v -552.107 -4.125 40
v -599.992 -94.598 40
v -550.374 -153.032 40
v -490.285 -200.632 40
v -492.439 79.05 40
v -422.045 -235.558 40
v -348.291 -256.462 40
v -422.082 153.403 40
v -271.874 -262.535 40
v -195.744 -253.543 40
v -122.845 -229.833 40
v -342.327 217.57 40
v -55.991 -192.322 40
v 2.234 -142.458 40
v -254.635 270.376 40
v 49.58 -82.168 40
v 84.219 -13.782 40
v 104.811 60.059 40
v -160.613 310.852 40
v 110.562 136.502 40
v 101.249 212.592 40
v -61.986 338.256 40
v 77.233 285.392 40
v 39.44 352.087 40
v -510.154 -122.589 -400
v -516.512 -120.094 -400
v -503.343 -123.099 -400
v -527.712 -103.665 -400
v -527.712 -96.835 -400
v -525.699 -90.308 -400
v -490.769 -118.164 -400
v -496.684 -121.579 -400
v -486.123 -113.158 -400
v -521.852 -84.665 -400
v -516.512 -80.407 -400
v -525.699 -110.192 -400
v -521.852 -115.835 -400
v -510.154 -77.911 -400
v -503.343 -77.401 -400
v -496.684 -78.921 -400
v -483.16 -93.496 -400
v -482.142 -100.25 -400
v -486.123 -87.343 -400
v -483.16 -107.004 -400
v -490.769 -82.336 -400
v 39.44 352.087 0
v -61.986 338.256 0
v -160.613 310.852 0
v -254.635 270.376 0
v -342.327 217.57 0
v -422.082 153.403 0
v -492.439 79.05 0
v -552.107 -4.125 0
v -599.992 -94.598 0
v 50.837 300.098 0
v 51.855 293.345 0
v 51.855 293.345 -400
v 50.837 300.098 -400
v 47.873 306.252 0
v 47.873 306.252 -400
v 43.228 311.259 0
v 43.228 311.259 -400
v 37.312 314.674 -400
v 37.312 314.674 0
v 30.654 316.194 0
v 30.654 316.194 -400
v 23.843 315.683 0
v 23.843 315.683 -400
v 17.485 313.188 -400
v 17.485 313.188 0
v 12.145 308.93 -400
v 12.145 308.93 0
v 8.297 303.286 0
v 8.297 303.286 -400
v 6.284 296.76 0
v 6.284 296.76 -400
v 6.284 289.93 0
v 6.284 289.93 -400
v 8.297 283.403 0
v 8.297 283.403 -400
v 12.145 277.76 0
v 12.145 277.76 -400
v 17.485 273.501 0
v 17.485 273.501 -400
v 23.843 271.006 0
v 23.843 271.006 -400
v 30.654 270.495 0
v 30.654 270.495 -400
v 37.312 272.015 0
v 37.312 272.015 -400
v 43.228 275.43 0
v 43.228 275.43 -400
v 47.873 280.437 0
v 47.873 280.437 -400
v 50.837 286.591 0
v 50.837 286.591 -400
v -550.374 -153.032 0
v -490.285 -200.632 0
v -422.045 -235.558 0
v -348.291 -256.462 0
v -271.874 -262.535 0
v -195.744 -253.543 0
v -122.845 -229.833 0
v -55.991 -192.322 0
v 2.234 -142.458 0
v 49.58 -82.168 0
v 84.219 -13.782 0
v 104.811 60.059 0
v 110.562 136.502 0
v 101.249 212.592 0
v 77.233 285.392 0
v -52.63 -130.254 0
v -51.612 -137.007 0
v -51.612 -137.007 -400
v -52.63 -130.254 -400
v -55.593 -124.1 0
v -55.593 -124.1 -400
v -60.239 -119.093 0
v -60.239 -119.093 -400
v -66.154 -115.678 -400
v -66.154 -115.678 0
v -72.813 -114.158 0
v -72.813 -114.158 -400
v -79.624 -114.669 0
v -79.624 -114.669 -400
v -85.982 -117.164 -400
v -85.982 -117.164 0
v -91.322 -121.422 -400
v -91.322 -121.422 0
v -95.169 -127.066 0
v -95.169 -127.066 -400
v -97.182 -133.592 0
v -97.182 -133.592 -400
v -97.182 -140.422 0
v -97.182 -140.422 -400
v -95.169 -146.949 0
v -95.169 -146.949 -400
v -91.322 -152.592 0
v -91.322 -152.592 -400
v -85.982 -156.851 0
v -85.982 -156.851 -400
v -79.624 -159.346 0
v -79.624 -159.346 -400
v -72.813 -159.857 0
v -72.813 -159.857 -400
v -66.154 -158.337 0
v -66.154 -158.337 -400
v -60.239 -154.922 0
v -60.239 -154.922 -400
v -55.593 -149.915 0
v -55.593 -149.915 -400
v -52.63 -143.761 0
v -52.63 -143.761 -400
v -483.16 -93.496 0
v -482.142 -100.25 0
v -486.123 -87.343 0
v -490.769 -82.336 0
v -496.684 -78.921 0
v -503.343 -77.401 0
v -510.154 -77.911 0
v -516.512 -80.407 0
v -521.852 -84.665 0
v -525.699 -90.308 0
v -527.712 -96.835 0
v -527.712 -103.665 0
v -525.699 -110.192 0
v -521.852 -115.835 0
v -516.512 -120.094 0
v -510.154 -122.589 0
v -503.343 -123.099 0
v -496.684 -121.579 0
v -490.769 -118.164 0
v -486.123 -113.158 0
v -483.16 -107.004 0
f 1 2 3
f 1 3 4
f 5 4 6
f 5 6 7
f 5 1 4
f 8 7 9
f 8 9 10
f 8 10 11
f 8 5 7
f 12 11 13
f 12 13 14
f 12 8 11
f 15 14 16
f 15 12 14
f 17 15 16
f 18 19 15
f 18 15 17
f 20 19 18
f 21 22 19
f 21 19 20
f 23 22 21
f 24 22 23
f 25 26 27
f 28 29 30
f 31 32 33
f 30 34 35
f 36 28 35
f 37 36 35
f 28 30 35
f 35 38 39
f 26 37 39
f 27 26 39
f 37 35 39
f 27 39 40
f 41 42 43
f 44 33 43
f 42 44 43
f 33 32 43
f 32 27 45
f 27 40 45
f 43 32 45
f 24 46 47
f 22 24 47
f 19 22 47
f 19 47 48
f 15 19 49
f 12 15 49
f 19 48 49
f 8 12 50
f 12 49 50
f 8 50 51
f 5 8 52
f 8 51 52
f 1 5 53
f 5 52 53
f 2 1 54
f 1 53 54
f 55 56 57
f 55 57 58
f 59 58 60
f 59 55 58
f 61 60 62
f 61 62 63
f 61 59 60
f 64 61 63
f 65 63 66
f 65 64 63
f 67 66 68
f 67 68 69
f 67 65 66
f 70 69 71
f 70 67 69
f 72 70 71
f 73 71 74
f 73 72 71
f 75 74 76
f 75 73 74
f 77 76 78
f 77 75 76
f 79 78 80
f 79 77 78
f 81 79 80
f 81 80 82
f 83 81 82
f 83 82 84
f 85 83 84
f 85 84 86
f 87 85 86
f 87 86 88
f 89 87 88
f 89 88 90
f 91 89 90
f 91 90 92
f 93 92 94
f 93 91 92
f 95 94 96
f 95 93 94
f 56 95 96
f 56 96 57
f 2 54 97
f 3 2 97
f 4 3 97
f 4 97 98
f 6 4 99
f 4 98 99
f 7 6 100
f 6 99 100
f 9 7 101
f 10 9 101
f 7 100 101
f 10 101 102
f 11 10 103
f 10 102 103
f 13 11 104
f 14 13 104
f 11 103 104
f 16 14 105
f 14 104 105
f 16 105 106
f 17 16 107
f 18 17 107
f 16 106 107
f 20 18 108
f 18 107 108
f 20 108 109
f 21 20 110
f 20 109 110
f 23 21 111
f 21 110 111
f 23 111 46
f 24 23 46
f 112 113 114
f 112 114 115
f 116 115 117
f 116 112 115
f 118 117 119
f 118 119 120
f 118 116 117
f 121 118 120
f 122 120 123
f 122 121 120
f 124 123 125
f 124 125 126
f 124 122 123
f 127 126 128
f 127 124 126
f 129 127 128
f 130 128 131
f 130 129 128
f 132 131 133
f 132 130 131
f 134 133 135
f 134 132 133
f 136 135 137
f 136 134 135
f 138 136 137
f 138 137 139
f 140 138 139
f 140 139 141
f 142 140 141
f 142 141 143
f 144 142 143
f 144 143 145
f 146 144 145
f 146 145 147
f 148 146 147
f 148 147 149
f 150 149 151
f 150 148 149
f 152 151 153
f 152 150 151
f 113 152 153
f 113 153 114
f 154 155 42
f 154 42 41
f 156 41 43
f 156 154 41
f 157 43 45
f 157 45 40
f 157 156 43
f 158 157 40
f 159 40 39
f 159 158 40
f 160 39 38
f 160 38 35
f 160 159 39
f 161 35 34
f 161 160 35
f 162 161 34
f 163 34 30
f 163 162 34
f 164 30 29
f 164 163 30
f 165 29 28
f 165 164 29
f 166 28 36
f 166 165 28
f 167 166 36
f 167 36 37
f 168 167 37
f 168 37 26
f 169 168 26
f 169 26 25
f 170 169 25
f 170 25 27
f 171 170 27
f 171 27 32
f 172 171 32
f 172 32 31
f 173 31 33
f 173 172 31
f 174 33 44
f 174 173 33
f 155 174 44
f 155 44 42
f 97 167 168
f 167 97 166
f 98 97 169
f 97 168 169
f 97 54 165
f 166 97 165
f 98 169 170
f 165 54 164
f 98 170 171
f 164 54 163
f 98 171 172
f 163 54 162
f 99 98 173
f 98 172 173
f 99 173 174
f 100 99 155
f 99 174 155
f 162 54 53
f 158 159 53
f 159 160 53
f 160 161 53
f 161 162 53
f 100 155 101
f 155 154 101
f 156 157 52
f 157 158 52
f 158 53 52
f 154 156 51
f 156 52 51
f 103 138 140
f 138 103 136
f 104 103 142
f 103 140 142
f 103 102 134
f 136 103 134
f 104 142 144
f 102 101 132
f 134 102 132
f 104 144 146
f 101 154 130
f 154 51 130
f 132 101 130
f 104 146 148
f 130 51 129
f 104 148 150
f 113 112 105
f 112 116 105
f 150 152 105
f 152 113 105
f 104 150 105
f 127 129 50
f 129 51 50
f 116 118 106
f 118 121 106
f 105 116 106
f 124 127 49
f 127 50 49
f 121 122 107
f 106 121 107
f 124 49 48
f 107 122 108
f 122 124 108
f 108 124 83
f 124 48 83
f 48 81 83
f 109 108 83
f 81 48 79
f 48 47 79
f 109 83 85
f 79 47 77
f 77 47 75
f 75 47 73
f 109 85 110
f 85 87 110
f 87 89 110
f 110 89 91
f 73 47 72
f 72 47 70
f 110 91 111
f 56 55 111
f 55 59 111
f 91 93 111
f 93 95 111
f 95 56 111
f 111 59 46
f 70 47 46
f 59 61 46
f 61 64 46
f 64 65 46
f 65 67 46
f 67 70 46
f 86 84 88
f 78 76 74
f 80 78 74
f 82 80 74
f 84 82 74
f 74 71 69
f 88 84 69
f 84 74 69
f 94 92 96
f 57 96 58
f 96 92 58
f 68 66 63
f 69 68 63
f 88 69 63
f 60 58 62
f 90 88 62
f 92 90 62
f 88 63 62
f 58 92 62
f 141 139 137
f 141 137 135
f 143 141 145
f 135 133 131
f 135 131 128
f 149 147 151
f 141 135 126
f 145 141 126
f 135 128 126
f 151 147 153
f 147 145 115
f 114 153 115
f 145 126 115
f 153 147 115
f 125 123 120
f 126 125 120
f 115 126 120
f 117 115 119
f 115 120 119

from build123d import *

# Parameters (mm, degrees)
F0_R     = 22.9132131763
F1_DEPTH = 40
F2_DEPTH = 400


# Not quite as in the source:
# - a feature names something its author has since deleted; it is built from what else it names


with BuildPart() as f1:
    # F0 (on Top) → F1 (new body)
    with BuildSketch(Plane.XY):
        with BuildLine():
            ThreePointArc((-599.9922642108, -94.5975626578), (-55.9908868153, -192.3217779419), (39.4396888844, 352.0866405113))
            ThreePointArc((39.4396888844, 352.0866405113), (-342.3269144878, 217.5704996833), (-599.9922642108, -94.5975626578))
        make_face()
        with Locations((-505.0551273235, -100.2501100564)):
            Circle(F0_R, mode=Mode.SUBTRACT)
        with Locations((-74.5249837637, -137.0074301958)):
            Circle(F0_R, mode=Mode.SUBTRACT)
        with Locations((28.9413593709, 293.3445572853)):
            Circle(F0_R, mode=Mode.SUBTRACT)
        with Locations((28.9413593709, 293.3445572853)):
            Circle(F0_R)
        with Locations((-74.5249837637, -137.0074301958)):
            Circle(F0_R)
        with Locations((-505.0551273235, -100.2501100564)):
            Circle(F0_R)
    extrude(amount=F1_DEPTH)

    # F0 (on Top) → F2 (join)
    with BuildSketch(Plane.XY):
        with Locations((-505.0551273235, -100.2501100564)):
            Circle(F0_R)
        with Locations((-74.5249837637, -137.0074301958)):
            Circle(F0_R)
        with Locations((28.9413593709, 293.3445572853)):
            Circle(F0_R)
    extrude(amount=-F2_DEPTH)


solid = f1.part
